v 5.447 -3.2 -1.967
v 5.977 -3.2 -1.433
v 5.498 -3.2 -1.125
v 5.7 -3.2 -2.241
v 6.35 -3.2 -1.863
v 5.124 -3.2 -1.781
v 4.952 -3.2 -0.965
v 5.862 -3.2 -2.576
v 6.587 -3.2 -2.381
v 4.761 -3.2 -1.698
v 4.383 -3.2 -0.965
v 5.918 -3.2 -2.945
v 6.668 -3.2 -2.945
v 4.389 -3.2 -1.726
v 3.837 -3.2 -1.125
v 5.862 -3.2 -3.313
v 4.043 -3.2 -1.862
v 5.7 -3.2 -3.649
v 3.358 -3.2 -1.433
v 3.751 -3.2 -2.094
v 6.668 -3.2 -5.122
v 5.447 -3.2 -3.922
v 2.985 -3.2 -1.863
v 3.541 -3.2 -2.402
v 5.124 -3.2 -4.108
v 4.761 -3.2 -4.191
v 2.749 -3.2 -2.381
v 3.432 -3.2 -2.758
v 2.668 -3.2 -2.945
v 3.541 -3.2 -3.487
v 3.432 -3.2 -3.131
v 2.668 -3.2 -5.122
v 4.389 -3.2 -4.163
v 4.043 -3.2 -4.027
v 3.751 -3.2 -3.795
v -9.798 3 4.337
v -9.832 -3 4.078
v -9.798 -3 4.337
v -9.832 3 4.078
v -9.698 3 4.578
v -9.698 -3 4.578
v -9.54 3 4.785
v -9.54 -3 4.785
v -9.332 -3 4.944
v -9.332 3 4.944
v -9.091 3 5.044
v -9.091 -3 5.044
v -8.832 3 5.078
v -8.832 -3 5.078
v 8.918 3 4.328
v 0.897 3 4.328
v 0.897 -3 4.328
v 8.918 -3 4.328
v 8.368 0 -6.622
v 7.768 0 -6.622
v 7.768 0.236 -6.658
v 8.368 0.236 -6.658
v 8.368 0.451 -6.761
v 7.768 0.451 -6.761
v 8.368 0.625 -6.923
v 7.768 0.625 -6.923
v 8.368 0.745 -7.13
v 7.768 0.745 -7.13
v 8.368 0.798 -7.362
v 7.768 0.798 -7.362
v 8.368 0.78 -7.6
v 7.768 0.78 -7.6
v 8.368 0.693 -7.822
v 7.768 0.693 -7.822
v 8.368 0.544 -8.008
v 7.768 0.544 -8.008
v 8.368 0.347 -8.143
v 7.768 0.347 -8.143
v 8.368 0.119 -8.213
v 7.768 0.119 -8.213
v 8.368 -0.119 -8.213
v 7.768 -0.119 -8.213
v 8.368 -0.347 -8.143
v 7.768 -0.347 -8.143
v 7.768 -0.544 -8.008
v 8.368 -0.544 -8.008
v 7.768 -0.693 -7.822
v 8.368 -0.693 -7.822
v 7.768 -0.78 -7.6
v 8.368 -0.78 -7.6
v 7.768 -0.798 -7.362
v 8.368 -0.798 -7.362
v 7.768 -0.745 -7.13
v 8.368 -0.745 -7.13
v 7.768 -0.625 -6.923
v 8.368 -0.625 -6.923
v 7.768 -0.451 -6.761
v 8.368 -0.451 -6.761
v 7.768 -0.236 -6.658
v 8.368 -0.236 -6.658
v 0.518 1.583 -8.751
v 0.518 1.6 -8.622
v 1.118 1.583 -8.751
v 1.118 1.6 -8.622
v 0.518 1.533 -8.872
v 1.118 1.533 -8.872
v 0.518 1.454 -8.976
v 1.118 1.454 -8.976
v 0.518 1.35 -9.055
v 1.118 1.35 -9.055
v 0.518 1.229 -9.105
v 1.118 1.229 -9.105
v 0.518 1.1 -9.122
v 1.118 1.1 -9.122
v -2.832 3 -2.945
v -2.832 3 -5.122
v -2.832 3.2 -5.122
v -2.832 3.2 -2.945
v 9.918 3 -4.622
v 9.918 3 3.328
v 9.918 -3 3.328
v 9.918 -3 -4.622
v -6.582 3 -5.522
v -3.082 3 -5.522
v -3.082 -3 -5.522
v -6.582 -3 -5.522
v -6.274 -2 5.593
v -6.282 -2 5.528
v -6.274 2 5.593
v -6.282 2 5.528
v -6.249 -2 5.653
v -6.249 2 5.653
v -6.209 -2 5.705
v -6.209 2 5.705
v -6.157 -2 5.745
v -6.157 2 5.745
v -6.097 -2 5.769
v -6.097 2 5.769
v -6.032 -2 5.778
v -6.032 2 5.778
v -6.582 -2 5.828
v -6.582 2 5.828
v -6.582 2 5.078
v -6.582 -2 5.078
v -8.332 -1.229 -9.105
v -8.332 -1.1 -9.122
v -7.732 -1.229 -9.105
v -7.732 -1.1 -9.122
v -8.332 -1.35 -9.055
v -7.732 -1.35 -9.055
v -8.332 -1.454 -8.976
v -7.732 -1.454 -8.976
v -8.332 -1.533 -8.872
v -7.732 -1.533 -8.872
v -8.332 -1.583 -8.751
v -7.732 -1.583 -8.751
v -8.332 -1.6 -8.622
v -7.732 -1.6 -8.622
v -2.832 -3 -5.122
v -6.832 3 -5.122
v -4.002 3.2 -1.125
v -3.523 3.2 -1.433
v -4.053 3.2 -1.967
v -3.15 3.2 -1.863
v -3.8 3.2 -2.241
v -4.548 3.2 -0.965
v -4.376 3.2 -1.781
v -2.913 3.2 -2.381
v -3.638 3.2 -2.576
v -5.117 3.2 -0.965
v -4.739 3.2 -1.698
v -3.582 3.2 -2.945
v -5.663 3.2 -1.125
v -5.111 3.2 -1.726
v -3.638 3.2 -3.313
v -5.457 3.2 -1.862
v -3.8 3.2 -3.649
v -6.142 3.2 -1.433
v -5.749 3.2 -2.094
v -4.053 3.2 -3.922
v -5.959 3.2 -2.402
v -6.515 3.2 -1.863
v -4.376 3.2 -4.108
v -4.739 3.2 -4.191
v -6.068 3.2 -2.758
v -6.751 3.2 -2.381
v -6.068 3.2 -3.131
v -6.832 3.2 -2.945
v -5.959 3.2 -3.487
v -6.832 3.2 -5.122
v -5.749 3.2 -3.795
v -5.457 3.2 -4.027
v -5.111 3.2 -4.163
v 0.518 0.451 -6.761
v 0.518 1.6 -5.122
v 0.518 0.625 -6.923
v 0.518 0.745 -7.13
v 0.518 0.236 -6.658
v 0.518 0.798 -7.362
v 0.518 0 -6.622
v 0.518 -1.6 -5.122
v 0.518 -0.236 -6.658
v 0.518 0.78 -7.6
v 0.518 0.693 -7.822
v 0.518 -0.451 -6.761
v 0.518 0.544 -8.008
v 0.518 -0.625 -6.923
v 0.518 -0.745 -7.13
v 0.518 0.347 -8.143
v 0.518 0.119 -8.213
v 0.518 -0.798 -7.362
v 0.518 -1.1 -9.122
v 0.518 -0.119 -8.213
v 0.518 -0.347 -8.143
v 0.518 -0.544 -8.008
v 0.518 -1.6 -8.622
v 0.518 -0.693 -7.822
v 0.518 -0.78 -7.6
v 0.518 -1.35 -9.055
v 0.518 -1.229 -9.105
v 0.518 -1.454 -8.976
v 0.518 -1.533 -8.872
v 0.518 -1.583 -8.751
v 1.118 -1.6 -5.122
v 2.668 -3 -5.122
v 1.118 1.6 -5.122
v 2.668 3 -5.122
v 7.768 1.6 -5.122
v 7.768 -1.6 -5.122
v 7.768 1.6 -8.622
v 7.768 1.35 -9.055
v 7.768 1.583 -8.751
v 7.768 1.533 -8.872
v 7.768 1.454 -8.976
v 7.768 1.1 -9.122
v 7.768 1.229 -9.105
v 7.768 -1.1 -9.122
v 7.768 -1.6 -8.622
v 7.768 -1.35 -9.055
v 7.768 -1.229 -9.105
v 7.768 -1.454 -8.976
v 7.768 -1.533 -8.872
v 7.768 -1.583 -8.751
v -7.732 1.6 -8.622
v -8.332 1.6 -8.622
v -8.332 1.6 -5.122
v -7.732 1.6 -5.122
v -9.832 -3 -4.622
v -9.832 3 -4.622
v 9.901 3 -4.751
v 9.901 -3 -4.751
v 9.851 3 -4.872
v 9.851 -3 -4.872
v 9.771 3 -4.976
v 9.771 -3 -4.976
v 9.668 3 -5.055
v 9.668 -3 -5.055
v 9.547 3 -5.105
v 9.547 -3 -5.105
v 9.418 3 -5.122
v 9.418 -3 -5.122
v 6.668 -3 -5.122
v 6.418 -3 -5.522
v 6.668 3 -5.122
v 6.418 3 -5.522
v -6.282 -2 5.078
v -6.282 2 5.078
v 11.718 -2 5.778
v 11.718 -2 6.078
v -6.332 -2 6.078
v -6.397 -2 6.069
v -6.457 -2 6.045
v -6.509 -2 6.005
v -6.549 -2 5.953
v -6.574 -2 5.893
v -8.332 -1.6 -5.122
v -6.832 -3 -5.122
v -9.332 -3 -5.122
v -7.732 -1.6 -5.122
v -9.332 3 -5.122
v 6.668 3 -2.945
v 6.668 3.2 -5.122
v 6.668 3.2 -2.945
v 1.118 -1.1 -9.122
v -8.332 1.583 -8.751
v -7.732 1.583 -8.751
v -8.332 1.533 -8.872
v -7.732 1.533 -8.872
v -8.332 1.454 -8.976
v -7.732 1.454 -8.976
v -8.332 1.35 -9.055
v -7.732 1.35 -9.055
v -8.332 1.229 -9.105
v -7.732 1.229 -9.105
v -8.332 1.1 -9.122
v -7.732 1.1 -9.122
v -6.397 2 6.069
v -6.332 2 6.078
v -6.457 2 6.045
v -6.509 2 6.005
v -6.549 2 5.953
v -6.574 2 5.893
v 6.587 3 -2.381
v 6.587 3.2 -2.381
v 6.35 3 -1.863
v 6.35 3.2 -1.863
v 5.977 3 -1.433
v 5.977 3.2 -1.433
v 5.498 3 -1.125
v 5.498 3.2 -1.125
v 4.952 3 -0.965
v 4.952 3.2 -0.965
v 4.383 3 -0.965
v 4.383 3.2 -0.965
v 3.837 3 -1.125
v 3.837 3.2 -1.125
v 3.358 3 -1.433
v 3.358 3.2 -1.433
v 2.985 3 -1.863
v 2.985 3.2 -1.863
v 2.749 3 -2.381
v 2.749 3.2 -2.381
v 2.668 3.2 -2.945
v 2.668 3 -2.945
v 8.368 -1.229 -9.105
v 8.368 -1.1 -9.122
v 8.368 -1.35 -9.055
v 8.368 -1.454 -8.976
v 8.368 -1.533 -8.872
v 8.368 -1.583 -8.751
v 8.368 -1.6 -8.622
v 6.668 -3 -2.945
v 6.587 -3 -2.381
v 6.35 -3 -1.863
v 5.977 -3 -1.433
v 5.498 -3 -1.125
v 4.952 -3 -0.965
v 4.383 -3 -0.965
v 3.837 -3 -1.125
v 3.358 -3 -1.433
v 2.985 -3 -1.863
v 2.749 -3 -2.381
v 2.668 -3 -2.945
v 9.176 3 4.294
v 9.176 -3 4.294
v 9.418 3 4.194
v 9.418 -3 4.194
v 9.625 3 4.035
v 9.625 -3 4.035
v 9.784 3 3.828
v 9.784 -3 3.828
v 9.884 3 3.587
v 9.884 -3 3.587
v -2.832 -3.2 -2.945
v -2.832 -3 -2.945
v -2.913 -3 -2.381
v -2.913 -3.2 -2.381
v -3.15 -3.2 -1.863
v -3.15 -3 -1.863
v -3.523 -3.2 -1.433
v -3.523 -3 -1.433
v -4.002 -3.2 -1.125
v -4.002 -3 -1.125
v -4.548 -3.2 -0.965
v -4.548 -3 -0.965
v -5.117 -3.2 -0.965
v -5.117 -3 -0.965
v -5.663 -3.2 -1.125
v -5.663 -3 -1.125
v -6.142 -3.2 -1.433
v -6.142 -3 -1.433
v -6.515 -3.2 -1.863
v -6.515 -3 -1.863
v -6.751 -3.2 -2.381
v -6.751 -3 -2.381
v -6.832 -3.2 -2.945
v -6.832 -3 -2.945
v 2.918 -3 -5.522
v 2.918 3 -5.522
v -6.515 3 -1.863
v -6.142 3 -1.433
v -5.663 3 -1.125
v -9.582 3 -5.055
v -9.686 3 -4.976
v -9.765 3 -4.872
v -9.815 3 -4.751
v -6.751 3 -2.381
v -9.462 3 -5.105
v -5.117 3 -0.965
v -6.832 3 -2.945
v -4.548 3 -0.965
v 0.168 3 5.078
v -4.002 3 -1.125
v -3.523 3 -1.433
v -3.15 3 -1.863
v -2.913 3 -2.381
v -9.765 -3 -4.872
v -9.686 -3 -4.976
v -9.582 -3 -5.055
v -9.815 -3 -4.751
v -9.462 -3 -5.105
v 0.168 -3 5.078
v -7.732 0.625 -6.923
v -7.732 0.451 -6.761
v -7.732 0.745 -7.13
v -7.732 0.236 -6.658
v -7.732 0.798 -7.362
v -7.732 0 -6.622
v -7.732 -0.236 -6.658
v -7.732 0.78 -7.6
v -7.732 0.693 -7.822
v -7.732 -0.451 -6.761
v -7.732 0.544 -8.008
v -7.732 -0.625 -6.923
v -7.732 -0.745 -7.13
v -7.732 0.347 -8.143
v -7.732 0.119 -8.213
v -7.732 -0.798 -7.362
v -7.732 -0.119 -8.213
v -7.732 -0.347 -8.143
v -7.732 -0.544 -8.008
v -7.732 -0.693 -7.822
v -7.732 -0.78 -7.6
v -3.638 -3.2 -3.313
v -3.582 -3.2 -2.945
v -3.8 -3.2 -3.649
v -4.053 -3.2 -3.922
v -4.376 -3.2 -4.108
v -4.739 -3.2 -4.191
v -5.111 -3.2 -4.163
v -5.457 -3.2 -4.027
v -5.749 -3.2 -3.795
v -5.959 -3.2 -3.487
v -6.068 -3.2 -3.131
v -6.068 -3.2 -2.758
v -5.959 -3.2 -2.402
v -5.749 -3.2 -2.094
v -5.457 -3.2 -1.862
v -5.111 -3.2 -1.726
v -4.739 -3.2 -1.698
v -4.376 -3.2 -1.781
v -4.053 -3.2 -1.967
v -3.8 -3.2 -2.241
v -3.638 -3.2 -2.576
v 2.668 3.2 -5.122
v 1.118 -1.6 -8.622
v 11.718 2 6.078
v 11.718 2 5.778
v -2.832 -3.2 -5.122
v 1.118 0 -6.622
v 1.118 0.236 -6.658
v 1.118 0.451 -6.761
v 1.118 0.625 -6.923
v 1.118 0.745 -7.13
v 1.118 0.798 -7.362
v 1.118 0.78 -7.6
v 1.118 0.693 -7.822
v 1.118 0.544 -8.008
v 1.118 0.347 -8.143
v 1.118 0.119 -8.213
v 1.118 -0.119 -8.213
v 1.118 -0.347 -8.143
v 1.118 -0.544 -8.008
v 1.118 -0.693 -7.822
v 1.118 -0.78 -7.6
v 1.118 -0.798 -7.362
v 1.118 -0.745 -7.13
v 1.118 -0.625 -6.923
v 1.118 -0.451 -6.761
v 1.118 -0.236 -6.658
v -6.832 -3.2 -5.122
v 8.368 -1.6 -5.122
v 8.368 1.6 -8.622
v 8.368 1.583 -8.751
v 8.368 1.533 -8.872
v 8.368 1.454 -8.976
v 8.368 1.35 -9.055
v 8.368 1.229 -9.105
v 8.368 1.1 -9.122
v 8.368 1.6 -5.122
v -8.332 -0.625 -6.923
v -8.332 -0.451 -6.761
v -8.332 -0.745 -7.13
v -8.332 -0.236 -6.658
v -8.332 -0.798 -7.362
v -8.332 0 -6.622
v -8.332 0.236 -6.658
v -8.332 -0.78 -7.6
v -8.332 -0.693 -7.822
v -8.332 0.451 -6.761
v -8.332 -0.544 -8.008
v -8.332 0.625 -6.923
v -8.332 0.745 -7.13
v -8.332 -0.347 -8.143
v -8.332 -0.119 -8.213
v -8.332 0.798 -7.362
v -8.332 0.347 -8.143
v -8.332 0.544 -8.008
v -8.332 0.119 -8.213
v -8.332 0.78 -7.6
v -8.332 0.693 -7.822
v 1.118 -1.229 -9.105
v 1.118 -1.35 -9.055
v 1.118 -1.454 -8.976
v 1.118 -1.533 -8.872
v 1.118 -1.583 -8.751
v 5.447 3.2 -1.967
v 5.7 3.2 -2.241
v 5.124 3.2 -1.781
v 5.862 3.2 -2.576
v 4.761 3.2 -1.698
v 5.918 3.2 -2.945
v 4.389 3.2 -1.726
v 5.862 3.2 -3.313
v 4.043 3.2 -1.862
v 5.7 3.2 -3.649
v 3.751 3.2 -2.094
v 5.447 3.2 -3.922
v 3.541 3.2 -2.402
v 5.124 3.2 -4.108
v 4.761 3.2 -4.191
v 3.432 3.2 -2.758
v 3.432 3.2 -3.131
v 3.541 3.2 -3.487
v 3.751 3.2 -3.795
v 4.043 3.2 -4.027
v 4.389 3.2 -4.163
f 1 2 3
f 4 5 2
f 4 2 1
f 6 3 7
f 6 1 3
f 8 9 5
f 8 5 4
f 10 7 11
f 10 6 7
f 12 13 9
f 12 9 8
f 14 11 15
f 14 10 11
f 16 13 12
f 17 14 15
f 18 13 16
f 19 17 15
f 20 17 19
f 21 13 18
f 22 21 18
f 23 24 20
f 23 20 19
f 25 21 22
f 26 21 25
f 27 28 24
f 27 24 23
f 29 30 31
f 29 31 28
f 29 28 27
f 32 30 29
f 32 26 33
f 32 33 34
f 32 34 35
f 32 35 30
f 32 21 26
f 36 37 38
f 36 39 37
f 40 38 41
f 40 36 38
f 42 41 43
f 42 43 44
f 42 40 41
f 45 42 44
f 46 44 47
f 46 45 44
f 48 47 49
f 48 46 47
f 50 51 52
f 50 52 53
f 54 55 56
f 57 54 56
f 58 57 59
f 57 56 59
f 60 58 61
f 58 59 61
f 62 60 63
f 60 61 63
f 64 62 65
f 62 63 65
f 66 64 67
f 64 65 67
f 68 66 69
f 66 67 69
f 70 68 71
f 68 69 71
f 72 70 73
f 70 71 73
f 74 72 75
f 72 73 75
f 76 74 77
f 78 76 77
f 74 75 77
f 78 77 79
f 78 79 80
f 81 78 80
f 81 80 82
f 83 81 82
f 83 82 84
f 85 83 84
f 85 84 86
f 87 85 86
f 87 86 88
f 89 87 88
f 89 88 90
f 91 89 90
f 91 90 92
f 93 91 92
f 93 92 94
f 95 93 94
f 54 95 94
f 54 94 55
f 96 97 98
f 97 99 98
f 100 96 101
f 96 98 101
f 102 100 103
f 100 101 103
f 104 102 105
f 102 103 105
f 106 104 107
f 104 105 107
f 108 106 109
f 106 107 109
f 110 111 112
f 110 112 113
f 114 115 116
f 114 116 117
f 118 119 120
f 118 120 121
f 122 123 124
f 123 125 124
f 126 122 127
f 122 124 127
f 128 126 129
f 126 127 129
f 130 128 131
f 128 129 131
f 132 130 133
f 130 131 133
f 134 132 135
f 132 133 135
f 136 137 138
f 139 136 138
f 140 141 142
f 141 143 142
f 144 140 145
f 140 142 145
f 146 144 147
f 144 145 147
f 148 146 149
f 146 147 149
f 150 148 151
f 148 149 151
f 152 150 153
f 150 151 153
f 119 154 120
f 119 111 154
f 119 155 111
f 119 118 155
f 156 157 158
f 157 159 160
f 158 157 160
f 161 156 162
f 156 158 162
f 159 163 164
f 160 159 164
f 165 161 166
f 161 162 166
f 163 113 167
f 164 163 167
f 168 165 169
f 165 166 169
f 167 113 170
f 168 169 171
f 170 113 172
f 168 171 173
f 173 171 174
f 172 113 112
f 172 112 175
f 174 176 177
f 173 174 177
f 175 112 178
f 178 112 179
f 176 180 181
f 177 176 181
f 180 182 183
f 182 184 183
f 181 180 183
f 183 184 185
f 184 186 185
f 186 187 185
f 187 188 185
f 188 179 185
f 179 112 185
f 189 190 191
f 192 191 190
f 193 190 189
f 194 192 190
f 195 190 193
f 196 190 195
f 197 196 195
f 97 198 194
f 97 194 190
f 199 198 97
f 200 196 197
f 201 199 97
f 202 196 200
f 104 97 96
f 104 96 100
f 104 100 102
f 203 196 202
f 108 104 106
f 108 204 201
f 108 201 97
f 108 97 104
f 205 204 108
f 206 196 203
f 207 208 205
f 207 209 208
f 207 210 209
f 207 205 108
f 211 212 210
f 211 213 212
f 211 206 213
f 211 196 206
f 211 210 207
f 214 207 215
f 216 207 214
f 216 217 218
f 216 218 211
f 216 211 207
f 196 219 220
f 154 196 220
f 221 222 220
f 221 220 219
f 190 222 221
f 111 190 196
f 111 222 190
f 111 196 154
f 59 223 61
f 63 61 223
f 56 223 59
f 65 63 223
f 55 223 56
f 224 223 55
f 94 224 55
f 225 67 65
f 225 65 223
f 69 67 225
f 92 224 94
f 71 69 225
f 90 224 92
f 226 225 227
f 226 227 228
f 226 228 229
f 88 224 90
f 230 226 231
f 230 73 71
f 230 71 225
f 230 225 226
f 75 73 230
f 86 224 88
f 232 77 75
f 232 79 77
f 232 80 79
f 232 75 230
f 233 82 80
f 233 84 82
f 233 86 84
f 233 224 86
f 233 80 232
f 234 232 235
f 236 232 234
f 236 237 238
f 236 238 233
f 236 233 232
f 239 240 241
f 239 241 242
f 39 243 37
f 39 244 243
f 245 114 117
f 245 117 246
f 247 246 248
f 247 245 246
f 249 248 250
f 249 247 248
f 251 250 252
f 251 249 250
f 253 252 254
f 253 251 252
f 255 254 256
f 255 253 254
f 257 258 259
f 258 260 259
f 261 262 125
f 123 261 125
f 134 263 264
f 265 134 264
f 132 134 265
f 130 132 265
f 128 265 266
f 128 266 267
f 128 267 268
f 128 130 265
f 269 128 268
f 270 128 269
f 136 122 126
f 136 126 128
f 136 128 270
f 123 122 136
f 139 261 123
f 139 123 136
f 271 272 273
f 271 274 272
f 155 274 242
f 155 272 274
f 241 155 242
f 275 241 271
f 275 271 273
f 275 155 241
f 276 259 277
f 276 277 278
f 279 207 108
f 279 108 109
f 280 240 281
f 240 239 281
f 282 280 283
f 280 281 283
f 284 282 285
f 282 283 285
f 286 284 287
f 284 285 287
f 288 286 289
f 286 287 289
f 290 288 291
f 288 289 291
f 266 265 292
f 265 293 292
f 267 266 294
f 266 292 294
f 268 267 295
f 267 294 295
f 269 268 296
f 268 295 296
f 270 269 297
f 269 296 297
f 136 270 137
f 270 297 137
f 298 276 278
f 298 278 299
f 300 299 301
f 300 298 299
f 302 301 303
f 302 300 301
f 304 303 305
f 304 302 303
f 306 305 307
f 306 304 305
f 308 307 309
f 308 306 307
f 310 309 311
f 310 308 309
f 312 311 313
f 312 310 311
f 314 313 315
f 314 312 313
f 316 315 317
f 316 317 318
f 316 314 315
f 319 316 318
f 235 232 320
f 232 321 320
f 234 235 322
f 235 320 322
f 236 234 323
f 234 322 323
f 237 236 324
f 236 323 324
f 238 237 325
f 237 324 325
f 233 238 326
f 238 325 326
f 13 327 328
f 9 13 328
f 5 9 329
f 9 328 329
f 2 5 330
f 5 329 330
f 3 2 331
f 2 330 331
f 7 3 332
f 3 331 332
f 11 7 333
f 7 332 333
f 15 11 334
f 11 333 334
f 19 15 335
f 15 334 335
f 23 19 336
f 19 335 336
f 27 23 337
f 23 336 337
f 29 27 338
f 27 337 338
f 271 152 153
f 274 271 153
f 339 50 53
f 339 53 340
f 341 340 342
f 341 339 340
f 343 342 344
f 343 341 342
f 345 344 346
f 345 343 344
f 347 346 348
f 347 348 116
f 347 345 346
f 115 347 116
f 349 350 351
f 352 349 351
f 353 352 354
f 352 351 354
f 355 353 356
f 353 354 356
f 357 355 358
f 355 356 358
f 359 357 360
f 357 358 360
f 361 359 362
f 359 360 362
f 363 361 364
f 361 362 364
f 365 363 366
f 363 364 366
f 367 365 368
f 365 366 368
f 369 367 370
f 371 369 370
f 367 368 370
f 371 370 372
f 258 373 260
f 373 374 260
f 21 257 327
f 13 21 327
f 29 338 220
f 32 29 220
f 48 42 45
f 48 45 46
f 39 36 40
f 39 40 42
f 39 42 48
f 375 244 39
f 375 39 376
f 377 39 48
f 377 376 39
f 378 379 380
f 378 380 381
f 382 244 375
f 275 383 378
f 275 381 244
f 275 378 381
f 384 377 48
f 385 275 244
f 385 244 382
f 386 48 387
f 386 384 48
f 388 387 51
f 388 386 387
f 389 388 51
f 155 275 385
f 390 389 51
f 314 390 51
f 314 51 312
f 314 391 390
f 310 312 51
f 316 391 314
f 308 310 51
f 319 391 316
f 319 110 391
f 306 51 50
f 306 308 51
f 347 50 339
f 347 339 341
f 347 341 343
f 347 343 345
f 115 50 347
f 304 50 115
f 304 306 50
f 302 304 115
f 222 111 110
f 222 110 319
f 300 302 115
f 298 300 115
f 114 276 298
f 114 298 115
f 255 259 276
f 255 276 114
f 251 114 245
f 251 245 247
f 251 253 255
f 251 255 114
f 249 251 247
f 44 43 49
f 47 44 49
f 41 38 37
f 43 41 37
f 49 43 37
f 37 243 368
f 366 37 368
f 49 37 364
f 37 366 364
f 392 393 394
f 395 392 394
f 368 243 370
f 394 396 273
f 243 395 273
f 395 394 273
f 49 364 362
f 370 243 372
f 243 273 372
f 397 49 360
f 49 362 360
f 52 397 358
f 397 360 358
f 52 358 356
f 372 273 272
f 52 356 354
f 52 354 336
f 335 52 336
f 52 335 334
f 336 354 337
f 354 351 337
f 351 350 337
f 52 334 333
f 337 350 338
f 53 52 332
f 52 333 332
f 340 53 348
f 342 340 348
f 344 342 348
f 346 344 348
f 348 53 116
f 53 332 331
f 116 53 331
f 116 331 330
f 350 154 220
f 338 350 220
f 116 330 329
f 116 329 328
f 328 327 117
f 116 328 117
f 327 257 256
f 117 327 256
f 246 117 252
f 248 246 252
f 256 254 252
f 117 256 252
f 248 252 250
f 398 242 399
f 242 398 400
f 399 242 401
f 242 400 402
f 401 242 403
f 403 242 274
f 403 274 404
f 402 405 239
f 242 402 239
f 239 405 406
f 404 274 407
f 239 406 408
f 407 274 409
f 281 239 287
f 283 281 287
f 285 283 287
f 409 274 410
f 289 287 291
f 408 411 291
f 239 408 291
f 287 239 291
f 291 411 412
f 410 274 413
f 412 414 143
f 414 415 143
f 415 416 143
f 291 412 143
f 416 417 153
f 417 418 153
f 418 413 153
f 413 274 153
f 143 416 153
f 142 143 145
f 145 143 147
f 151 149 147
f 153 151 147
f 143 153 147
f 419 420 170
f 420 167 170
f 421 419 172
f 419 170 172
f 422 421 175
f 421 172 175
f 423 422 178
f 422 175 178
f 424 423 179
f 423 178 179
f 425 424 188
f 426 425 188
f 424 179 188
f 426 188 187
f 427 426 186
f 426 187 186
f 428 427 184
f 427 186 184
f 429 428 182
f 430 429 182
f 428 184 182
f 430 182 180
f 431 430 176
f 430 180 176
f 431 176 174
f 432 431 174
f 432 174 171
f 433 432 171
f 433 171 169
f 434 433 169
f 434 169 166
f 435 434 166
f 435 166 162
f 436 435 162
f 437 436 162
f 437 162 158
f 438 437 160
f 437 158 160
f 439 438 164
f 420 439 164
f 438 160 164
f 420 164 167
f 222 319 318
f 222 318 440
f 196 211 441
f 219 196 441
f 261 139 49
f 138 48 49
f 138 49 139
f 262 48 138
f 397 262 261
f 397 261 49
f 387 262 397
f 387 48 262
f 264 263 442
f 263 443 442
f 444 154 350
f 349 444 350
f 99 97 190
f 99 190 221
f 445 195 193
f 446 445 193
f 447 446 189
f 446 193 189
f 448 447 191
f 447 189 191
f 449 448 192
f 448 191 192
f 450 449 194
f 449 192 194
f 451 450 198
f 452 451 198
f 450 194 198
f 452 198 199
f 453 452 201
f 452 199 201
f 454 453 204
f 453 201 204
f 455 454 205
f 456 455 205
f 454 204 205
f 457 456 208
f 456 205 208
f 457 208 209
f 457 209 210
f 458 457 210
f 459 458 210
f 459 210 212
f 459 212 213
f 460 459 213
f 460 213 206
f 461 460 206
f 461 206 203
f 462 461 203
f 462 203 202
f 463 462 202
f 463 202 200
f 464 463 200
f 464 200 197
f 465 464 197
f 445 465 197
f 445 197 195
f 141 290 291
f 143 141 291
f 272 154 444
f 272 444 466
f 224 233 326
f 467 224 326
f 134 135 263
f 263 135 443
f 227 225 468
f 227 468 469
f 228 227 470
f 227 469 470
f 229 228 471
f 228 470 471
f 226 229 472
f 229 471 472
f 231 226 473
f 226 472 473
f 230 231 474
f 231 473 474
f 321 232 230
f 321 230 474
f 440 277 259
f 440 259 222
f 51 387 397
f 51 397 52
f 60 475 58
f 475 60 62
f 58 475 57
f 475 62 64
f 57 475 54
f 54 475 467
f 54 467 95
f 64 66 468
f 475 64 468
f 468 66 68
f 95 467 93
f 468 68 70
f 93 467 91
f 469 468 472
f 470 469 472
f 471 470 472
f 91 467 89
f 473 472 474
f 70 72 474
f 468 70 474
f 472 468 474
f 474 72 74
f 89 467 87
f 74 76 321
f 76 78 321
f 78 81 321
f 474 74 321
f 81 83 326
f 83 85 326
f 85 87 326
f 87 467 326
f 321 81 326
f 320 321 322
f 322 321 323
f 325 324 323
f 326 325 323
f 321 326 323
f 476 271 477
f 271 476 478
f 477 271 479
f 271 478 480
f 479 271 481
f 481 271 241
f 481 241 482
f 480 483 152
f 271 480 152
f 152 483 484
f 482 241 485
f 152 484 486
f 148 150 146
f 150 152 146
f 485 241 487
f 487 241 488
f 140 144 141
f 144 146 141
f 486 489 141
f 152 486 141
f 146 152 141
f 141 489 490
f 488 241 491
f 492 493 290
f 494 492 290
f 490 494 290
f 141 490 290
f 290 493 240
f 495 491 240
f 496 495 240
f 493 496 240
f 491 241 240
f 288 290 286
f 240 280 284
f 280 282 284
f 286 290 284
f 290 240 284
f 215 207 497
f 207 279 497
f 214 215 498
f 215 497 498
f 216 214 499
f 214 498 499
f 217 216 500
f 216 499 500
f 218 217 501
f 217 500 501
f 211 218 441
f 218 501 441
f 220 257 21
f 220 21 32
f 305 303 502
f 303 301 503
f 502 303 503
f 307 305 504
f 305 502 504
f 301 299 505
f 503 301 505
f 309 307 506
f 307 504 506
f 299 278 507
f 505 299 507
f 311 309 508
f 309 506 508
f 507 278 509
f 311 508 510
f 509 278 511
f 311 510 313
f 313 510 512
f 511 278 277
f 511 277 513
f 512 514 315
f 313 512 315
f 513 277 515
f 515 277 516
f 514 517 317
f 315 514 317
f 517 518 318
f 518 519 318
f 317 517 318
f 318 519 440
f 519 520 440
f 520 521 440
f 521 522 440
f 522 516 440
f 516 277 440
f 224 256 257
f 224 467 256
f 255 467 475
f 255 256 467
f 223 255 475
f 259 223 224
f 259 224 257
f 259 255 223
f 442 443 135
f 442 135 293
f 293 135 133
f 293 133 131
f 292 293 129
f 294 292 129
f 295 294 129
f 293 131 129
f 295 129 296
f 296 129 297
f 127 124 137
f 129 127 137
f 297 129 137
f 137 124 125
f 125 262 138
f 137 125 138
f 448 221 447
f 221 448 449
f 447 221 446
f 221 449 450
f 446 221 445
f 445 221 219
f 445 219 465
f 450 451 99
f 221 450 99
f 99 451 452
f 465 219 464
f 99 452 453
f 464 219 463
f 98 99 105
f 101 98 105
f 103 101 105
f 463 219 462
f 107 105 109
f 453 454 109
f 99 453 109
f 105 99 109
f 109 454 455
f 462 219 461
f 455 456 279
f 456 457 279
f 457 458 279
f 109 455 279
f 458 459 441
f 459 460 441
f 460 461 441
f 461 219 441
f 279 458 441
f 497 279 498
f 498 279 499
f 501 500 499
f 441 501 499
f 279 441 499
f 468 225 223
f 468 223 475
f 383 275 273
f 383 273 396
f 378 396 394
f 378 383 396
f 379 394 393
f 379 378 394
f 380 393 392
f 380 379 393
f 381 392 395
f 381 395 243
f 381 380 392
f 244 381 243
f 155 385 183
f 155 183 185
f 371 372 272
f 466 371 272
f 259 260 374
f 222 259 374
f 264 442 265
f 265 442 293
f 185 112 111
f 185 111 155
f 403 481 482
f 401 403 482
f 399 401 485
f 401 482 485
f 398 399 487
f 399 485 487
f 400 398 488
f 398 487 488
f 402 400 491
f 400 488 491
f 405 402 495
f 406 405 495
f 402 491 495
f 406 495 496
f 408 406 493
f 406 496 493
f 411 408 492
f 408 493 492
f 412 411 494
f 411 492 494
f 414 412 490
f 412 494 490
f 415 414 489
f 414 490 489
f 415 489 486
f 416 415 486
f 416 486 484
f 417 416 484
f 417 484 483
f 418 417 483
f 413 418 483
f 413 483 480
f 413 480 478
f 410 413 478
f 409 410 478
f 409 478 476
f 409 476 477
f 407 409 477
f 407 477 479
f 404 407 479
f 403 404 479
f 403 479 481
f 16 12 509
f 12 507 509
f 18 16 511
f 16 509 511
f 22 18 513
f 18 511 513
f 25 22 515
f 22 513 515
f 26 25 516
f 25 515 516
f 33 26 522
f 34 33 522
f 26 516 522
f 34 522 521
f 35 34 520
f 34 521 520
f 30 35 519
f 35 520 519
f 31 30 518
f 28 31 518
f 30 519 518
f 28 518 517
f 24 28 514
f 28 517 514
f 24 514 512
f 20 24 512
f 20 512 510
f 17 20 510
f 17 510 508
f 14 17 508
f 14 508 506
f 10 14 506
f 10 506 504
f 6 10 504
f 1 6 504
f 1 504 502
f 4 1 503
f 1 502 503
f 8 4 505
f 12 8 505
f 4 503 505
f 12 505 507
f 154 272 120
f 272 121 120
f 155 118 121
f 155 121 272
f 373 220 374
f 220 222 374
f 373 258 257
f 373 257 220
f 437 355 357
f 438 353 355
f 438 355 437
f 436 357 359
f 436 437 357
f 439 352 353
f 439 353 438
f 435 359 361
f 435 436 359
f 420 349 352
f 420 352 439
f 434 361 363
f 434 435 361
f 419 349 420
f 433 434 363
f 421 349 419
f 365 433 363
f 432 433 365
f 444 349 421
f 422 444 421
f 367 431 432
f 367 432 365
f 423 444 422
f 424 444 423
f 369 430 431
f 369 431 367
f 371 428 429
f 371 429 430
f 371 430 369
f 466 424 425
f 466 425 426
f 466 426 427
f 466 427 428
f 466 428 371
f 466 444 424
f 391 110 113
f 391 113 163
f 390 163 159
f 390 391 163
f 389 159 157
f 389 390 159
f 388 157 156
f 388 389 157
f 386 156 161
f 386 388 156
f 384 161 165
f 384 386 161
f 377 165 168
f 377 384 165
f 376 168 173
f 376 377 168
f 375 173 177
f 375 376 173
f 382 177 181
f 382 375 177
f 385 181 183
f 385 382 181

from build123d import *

# Parameters (mm, degrees)
BOSS_EXTRUDE1_DEPTH      = 3
BOSS_EXTRUDE1_DEPTH_BACK = 3
BOSS_EXTRUDE2_DEPTH      = 2
BOSS_EXTRUDE2_DEPTH_BACK = 2
BOSS_EXTRUDE3_DEPTH      = 3.2
BOSS_EXTRUDE3_DEPTH_BACK = 3.2
SKETCH3_R                = 1.25
CUT_EXTRUDE1_DEPTH       = 1.2
CUT_EXTRUDE1_DEPTH_BACK  = 7.2
BOSS_EXTRUDE4_DEPTH      = 3
BOSS_EXTRUDE4_DEPTH_BACK = 3
SKETCH6_W                = 0.6
SKETCH6_H                = 4
BOSS_EXTRUDE5_DEPTH      = 1.6
BOSS_EXTRUDE5_DEPTH_BACK = 1.6
FILLET1_R                = 0.5
SKETCH7_R                = 0.8
CUT_EXTRUDE2_DEPTH       = 2.5
CUT_EXTRUDE2_DEPTH_BACK  = 21.05


with BuildPart() as part:
    # Sketch1 → Boss-Extrude1 (new body, two sides)
    with BuildSketch(Plane(origin=(0, 0, 0), x_dir=(1, 0, 0), z_dir=(0, 1, 0))) as boss_extrude1_sk:
        with BuildLine():
            Line((-8.832423279, -5.07801101), (0.167576721, -5.07801101))
            Line((0.167576721, -5.07801101), (0.89698899, -4.32801101))
            Line((0.89698899, -4.32801101), (8.917576721, -4.32801101))
            ThreePointArc((8.917576721, -4.32801101), (9.624683502, -4.035117791), (9.917576721, -3.32801101))
            Line((9.917576721, -3.32801101), (9.917576721, 4.62198899))
            ThreePointArc((9.917576721, 4.62198899), (9.771130112, 4.975542381), (9.417576721, 5.12198899))
            Line((9.417576721, 5.12198899), (-9.332423279, 5.12198899))
            ThreePointArc((-9.332423279, 5.12198899), (-9.685976669, 4.975542381), (-9.832423279, 4.62198899))
            Line((-9.832423279, 4.62198899), (-9.832423279, -4.07801101))
            ThreePointArc((-9.832423279, -4.07801101), (-9.53953006, -4.785117791), (-8.832423279, -5.07801101))
        make_face()
    extrude(amount=BOSS_EXTRUDE1_DEPTH)
    extrude(boss_extrude1_sk.sketch, amount=-BOSS_EXTRUDE1_DEPTH_BACK)

    # Sketch2 → Boss-Extrude2 (add, two sides)
    with BuildSketch(Plane(origin=(0, 0, 0), x_dir=(1, 0, 0), z_dir=(0, 1, 0))) as boss_extrude2_sk:
        with BuildLine():
            Line((-6.582423279, -5.07801101), (-6.282423279, -5.07801101))
            Line((-6.282423279, -5.07801101), (-6.282423279, -5.52801101))
            ThreePointArc((-6.282423279, -5.52801101), (-6.209199974, -5.704787705), (-6.032423279, -5.77801101))
            Line((-6.032423279, -5.77801101), (11.717576721, -5.77801101))
            Line((11.717576721, -5.77801101), (11.717576721, -6.07801101))
            Line((11.717576721, -6.07801101), (-6.282423279, -6.07801101))
            Line((-6.282423279, -6.07801101), (-6.332423279, -6.07801101))
            ThreePointArc((-6.332423279, -6.07801101), (-6.509199974, -6.004787705), (-6.582423279, -5.82801101))
            Line((-6.582423279, -5.82801101), (-6.582423279, -5.07801101))
        make_face()
    extrude(amount=BOSS_EXTRUDE2_DEPTH)
    extrude(boss_extrude2_sk.sketch, amount=-BOSS_EXTRUDE2_DEPTH_BACK)

    # Sketch4 → Boss-Extrude3 (add, two sides)
    with BuildSketch(Plane(origin=(0, 0, 0), x_dir=(1, 0, 0), z_dir=(0, 1, 0))) as boss_extrude3_sk:
        with BuildLine():
            Line((-6.832423279, 2.944690743), (-6.832423279, 5.12198899))
            Line((-6.832423279, 5.12198899), (-2.832423279, 5.12198899))
            Line((-2.832423279, 5.12198899), (-2.832423279, 2.944690743))
            ThreePointArc((-2.832423279, 2.944690743), (-4.832423279, 0.944690743), (-6.832423279, 2.944690743))
        make_face()
        with BuildLine():
            Line((6.667576721, 5.12198899), (6.667576721, 2.944690743))
            ThreePointArc((6.667576721, 2.944690743), (4.667576721, 0.944690743), (2.667576721, 2.944690743))
            Line((2.667576721, 2.944690743), (2.667576721, 5.12198899))
            Line((2.667576721, 5.12198899), (6.667576721, 5.12198899))
        make_face()
    extrude(amount=BOSS_EXTRUDE3_DEPTH)
    extrude(boss_extrude3_sk.sketch, amount=-BOSS_EXTRUDE3_DEPTH_BACK)

    # Sketch3 → Cut-Extrude1 (cut, two sides)
    with BuildSketch(Plane(origin=(0, 3, 0), x_dir=(1, 0, 0), z_dir=(0, 1, 0))) as cut_extrude1_sk:
        with Locations((-4.832423279, 2.944690743)):
            Circle(SKETCH3_R)
        with Locations((4.667576721, 2.944690743)):
            Circle(SKETCH3_R)
    extrude(amount=CUT_EXTRUDE1_DEPTH, mode=Mode.SUBTRACT)
    extrude(cut_extrude1_sk.sketch, amount=-CUT_EXTRUDE1_DEPTH_BACK, mode=Mode.SUBTRACT)

    # Sketch5 → Boss-Extrude4 (add, two sides)
    with BuildSketch(Plane(origin=(0, 0, 0), x_dir=(1, 0, 0), z_dir=(0, 1, 0))) as boss_extrude4_sk:
        Polygon((-6.832423279, 5.12198899), (-2.832423279, 5.12198899), (-3.082423279, 5.52198899), (-6.582423279, 5.52198899), align=None)
        Polygon((6.417576721, 5.52198899), (6.667576721, 5.12198899), (2.667576721, 5.12198899), (2.917576721, 5.52198899), align=None)
    extrude(amount=BOSS_EXTRUDE4_DEPTH)
    extrude(boss_extrude4_sk.sketch, amount=-BOSS_EXTRUDE4_DEPTH_BACK)

    # Sketch6 → Boss-Extrude5 (add, two sides)
    with BuildSketch(Plane(origin=(0, 0, 0), x_dir=(1, 0, 0), z_dir=(0, 1, 0))) as boss_extrude5_sk:
        with Locations((-8.032423279, 7.12198899)):
            Rectangle(SKETCH6_W, SKETCH6_H)
        with Locations((0.817576721, 7.12198899)):
            Rectangle(SKETCH6_W, SKETCH6_H)
        with Locations((8.067576721, 7.12198899)):
            Rectangle(SKETCH6_W, SKETCH6_H)
    extrude(amount=BOSS_EXTRUDE5_DEPTH)
    extrude(boss_extrude5_sk.sketch, amount=-BOSS_EXTRUDE5_DEPTH_BACK)

    # Fillet1
    fillet1_edges = [part.edges().sort_by_distance(p)[0] for p in [
        (-8.032423279, -1.6, -9.12198899),
        (-8.032423279, 1.6, -9.12198899),
        (0.817576721, -1.6, -9.12198899),
        (0.817576721, 1.6, -9.12198899),
        (8.067576721, -1.6, -9.12198899),
        (8.067576721, 1.6, -9.12198899),
    ]]
    fillet(fillet1_edges, radius=FILLET1_R)

    # Sketch7 → Cut-Extrude2 (cut, two sides)
    with BuildSketch(Plane.ZY.offset(8.332423279)) as cut_extrude2_sk:
        with Locations((-7.42198899, 0)):
            Circle(SKETCH7_R)
    extrude(amount=CUT_EXTRUDE2_DEPTH, mode=Mode.SUBTRACT)
    extrude(cut_extrude2_sk.sketch, amount=-CUT_EXTRUDE2_DEPTH_BACK, mode=Mode.SUBTRACT)


solid = part.part
